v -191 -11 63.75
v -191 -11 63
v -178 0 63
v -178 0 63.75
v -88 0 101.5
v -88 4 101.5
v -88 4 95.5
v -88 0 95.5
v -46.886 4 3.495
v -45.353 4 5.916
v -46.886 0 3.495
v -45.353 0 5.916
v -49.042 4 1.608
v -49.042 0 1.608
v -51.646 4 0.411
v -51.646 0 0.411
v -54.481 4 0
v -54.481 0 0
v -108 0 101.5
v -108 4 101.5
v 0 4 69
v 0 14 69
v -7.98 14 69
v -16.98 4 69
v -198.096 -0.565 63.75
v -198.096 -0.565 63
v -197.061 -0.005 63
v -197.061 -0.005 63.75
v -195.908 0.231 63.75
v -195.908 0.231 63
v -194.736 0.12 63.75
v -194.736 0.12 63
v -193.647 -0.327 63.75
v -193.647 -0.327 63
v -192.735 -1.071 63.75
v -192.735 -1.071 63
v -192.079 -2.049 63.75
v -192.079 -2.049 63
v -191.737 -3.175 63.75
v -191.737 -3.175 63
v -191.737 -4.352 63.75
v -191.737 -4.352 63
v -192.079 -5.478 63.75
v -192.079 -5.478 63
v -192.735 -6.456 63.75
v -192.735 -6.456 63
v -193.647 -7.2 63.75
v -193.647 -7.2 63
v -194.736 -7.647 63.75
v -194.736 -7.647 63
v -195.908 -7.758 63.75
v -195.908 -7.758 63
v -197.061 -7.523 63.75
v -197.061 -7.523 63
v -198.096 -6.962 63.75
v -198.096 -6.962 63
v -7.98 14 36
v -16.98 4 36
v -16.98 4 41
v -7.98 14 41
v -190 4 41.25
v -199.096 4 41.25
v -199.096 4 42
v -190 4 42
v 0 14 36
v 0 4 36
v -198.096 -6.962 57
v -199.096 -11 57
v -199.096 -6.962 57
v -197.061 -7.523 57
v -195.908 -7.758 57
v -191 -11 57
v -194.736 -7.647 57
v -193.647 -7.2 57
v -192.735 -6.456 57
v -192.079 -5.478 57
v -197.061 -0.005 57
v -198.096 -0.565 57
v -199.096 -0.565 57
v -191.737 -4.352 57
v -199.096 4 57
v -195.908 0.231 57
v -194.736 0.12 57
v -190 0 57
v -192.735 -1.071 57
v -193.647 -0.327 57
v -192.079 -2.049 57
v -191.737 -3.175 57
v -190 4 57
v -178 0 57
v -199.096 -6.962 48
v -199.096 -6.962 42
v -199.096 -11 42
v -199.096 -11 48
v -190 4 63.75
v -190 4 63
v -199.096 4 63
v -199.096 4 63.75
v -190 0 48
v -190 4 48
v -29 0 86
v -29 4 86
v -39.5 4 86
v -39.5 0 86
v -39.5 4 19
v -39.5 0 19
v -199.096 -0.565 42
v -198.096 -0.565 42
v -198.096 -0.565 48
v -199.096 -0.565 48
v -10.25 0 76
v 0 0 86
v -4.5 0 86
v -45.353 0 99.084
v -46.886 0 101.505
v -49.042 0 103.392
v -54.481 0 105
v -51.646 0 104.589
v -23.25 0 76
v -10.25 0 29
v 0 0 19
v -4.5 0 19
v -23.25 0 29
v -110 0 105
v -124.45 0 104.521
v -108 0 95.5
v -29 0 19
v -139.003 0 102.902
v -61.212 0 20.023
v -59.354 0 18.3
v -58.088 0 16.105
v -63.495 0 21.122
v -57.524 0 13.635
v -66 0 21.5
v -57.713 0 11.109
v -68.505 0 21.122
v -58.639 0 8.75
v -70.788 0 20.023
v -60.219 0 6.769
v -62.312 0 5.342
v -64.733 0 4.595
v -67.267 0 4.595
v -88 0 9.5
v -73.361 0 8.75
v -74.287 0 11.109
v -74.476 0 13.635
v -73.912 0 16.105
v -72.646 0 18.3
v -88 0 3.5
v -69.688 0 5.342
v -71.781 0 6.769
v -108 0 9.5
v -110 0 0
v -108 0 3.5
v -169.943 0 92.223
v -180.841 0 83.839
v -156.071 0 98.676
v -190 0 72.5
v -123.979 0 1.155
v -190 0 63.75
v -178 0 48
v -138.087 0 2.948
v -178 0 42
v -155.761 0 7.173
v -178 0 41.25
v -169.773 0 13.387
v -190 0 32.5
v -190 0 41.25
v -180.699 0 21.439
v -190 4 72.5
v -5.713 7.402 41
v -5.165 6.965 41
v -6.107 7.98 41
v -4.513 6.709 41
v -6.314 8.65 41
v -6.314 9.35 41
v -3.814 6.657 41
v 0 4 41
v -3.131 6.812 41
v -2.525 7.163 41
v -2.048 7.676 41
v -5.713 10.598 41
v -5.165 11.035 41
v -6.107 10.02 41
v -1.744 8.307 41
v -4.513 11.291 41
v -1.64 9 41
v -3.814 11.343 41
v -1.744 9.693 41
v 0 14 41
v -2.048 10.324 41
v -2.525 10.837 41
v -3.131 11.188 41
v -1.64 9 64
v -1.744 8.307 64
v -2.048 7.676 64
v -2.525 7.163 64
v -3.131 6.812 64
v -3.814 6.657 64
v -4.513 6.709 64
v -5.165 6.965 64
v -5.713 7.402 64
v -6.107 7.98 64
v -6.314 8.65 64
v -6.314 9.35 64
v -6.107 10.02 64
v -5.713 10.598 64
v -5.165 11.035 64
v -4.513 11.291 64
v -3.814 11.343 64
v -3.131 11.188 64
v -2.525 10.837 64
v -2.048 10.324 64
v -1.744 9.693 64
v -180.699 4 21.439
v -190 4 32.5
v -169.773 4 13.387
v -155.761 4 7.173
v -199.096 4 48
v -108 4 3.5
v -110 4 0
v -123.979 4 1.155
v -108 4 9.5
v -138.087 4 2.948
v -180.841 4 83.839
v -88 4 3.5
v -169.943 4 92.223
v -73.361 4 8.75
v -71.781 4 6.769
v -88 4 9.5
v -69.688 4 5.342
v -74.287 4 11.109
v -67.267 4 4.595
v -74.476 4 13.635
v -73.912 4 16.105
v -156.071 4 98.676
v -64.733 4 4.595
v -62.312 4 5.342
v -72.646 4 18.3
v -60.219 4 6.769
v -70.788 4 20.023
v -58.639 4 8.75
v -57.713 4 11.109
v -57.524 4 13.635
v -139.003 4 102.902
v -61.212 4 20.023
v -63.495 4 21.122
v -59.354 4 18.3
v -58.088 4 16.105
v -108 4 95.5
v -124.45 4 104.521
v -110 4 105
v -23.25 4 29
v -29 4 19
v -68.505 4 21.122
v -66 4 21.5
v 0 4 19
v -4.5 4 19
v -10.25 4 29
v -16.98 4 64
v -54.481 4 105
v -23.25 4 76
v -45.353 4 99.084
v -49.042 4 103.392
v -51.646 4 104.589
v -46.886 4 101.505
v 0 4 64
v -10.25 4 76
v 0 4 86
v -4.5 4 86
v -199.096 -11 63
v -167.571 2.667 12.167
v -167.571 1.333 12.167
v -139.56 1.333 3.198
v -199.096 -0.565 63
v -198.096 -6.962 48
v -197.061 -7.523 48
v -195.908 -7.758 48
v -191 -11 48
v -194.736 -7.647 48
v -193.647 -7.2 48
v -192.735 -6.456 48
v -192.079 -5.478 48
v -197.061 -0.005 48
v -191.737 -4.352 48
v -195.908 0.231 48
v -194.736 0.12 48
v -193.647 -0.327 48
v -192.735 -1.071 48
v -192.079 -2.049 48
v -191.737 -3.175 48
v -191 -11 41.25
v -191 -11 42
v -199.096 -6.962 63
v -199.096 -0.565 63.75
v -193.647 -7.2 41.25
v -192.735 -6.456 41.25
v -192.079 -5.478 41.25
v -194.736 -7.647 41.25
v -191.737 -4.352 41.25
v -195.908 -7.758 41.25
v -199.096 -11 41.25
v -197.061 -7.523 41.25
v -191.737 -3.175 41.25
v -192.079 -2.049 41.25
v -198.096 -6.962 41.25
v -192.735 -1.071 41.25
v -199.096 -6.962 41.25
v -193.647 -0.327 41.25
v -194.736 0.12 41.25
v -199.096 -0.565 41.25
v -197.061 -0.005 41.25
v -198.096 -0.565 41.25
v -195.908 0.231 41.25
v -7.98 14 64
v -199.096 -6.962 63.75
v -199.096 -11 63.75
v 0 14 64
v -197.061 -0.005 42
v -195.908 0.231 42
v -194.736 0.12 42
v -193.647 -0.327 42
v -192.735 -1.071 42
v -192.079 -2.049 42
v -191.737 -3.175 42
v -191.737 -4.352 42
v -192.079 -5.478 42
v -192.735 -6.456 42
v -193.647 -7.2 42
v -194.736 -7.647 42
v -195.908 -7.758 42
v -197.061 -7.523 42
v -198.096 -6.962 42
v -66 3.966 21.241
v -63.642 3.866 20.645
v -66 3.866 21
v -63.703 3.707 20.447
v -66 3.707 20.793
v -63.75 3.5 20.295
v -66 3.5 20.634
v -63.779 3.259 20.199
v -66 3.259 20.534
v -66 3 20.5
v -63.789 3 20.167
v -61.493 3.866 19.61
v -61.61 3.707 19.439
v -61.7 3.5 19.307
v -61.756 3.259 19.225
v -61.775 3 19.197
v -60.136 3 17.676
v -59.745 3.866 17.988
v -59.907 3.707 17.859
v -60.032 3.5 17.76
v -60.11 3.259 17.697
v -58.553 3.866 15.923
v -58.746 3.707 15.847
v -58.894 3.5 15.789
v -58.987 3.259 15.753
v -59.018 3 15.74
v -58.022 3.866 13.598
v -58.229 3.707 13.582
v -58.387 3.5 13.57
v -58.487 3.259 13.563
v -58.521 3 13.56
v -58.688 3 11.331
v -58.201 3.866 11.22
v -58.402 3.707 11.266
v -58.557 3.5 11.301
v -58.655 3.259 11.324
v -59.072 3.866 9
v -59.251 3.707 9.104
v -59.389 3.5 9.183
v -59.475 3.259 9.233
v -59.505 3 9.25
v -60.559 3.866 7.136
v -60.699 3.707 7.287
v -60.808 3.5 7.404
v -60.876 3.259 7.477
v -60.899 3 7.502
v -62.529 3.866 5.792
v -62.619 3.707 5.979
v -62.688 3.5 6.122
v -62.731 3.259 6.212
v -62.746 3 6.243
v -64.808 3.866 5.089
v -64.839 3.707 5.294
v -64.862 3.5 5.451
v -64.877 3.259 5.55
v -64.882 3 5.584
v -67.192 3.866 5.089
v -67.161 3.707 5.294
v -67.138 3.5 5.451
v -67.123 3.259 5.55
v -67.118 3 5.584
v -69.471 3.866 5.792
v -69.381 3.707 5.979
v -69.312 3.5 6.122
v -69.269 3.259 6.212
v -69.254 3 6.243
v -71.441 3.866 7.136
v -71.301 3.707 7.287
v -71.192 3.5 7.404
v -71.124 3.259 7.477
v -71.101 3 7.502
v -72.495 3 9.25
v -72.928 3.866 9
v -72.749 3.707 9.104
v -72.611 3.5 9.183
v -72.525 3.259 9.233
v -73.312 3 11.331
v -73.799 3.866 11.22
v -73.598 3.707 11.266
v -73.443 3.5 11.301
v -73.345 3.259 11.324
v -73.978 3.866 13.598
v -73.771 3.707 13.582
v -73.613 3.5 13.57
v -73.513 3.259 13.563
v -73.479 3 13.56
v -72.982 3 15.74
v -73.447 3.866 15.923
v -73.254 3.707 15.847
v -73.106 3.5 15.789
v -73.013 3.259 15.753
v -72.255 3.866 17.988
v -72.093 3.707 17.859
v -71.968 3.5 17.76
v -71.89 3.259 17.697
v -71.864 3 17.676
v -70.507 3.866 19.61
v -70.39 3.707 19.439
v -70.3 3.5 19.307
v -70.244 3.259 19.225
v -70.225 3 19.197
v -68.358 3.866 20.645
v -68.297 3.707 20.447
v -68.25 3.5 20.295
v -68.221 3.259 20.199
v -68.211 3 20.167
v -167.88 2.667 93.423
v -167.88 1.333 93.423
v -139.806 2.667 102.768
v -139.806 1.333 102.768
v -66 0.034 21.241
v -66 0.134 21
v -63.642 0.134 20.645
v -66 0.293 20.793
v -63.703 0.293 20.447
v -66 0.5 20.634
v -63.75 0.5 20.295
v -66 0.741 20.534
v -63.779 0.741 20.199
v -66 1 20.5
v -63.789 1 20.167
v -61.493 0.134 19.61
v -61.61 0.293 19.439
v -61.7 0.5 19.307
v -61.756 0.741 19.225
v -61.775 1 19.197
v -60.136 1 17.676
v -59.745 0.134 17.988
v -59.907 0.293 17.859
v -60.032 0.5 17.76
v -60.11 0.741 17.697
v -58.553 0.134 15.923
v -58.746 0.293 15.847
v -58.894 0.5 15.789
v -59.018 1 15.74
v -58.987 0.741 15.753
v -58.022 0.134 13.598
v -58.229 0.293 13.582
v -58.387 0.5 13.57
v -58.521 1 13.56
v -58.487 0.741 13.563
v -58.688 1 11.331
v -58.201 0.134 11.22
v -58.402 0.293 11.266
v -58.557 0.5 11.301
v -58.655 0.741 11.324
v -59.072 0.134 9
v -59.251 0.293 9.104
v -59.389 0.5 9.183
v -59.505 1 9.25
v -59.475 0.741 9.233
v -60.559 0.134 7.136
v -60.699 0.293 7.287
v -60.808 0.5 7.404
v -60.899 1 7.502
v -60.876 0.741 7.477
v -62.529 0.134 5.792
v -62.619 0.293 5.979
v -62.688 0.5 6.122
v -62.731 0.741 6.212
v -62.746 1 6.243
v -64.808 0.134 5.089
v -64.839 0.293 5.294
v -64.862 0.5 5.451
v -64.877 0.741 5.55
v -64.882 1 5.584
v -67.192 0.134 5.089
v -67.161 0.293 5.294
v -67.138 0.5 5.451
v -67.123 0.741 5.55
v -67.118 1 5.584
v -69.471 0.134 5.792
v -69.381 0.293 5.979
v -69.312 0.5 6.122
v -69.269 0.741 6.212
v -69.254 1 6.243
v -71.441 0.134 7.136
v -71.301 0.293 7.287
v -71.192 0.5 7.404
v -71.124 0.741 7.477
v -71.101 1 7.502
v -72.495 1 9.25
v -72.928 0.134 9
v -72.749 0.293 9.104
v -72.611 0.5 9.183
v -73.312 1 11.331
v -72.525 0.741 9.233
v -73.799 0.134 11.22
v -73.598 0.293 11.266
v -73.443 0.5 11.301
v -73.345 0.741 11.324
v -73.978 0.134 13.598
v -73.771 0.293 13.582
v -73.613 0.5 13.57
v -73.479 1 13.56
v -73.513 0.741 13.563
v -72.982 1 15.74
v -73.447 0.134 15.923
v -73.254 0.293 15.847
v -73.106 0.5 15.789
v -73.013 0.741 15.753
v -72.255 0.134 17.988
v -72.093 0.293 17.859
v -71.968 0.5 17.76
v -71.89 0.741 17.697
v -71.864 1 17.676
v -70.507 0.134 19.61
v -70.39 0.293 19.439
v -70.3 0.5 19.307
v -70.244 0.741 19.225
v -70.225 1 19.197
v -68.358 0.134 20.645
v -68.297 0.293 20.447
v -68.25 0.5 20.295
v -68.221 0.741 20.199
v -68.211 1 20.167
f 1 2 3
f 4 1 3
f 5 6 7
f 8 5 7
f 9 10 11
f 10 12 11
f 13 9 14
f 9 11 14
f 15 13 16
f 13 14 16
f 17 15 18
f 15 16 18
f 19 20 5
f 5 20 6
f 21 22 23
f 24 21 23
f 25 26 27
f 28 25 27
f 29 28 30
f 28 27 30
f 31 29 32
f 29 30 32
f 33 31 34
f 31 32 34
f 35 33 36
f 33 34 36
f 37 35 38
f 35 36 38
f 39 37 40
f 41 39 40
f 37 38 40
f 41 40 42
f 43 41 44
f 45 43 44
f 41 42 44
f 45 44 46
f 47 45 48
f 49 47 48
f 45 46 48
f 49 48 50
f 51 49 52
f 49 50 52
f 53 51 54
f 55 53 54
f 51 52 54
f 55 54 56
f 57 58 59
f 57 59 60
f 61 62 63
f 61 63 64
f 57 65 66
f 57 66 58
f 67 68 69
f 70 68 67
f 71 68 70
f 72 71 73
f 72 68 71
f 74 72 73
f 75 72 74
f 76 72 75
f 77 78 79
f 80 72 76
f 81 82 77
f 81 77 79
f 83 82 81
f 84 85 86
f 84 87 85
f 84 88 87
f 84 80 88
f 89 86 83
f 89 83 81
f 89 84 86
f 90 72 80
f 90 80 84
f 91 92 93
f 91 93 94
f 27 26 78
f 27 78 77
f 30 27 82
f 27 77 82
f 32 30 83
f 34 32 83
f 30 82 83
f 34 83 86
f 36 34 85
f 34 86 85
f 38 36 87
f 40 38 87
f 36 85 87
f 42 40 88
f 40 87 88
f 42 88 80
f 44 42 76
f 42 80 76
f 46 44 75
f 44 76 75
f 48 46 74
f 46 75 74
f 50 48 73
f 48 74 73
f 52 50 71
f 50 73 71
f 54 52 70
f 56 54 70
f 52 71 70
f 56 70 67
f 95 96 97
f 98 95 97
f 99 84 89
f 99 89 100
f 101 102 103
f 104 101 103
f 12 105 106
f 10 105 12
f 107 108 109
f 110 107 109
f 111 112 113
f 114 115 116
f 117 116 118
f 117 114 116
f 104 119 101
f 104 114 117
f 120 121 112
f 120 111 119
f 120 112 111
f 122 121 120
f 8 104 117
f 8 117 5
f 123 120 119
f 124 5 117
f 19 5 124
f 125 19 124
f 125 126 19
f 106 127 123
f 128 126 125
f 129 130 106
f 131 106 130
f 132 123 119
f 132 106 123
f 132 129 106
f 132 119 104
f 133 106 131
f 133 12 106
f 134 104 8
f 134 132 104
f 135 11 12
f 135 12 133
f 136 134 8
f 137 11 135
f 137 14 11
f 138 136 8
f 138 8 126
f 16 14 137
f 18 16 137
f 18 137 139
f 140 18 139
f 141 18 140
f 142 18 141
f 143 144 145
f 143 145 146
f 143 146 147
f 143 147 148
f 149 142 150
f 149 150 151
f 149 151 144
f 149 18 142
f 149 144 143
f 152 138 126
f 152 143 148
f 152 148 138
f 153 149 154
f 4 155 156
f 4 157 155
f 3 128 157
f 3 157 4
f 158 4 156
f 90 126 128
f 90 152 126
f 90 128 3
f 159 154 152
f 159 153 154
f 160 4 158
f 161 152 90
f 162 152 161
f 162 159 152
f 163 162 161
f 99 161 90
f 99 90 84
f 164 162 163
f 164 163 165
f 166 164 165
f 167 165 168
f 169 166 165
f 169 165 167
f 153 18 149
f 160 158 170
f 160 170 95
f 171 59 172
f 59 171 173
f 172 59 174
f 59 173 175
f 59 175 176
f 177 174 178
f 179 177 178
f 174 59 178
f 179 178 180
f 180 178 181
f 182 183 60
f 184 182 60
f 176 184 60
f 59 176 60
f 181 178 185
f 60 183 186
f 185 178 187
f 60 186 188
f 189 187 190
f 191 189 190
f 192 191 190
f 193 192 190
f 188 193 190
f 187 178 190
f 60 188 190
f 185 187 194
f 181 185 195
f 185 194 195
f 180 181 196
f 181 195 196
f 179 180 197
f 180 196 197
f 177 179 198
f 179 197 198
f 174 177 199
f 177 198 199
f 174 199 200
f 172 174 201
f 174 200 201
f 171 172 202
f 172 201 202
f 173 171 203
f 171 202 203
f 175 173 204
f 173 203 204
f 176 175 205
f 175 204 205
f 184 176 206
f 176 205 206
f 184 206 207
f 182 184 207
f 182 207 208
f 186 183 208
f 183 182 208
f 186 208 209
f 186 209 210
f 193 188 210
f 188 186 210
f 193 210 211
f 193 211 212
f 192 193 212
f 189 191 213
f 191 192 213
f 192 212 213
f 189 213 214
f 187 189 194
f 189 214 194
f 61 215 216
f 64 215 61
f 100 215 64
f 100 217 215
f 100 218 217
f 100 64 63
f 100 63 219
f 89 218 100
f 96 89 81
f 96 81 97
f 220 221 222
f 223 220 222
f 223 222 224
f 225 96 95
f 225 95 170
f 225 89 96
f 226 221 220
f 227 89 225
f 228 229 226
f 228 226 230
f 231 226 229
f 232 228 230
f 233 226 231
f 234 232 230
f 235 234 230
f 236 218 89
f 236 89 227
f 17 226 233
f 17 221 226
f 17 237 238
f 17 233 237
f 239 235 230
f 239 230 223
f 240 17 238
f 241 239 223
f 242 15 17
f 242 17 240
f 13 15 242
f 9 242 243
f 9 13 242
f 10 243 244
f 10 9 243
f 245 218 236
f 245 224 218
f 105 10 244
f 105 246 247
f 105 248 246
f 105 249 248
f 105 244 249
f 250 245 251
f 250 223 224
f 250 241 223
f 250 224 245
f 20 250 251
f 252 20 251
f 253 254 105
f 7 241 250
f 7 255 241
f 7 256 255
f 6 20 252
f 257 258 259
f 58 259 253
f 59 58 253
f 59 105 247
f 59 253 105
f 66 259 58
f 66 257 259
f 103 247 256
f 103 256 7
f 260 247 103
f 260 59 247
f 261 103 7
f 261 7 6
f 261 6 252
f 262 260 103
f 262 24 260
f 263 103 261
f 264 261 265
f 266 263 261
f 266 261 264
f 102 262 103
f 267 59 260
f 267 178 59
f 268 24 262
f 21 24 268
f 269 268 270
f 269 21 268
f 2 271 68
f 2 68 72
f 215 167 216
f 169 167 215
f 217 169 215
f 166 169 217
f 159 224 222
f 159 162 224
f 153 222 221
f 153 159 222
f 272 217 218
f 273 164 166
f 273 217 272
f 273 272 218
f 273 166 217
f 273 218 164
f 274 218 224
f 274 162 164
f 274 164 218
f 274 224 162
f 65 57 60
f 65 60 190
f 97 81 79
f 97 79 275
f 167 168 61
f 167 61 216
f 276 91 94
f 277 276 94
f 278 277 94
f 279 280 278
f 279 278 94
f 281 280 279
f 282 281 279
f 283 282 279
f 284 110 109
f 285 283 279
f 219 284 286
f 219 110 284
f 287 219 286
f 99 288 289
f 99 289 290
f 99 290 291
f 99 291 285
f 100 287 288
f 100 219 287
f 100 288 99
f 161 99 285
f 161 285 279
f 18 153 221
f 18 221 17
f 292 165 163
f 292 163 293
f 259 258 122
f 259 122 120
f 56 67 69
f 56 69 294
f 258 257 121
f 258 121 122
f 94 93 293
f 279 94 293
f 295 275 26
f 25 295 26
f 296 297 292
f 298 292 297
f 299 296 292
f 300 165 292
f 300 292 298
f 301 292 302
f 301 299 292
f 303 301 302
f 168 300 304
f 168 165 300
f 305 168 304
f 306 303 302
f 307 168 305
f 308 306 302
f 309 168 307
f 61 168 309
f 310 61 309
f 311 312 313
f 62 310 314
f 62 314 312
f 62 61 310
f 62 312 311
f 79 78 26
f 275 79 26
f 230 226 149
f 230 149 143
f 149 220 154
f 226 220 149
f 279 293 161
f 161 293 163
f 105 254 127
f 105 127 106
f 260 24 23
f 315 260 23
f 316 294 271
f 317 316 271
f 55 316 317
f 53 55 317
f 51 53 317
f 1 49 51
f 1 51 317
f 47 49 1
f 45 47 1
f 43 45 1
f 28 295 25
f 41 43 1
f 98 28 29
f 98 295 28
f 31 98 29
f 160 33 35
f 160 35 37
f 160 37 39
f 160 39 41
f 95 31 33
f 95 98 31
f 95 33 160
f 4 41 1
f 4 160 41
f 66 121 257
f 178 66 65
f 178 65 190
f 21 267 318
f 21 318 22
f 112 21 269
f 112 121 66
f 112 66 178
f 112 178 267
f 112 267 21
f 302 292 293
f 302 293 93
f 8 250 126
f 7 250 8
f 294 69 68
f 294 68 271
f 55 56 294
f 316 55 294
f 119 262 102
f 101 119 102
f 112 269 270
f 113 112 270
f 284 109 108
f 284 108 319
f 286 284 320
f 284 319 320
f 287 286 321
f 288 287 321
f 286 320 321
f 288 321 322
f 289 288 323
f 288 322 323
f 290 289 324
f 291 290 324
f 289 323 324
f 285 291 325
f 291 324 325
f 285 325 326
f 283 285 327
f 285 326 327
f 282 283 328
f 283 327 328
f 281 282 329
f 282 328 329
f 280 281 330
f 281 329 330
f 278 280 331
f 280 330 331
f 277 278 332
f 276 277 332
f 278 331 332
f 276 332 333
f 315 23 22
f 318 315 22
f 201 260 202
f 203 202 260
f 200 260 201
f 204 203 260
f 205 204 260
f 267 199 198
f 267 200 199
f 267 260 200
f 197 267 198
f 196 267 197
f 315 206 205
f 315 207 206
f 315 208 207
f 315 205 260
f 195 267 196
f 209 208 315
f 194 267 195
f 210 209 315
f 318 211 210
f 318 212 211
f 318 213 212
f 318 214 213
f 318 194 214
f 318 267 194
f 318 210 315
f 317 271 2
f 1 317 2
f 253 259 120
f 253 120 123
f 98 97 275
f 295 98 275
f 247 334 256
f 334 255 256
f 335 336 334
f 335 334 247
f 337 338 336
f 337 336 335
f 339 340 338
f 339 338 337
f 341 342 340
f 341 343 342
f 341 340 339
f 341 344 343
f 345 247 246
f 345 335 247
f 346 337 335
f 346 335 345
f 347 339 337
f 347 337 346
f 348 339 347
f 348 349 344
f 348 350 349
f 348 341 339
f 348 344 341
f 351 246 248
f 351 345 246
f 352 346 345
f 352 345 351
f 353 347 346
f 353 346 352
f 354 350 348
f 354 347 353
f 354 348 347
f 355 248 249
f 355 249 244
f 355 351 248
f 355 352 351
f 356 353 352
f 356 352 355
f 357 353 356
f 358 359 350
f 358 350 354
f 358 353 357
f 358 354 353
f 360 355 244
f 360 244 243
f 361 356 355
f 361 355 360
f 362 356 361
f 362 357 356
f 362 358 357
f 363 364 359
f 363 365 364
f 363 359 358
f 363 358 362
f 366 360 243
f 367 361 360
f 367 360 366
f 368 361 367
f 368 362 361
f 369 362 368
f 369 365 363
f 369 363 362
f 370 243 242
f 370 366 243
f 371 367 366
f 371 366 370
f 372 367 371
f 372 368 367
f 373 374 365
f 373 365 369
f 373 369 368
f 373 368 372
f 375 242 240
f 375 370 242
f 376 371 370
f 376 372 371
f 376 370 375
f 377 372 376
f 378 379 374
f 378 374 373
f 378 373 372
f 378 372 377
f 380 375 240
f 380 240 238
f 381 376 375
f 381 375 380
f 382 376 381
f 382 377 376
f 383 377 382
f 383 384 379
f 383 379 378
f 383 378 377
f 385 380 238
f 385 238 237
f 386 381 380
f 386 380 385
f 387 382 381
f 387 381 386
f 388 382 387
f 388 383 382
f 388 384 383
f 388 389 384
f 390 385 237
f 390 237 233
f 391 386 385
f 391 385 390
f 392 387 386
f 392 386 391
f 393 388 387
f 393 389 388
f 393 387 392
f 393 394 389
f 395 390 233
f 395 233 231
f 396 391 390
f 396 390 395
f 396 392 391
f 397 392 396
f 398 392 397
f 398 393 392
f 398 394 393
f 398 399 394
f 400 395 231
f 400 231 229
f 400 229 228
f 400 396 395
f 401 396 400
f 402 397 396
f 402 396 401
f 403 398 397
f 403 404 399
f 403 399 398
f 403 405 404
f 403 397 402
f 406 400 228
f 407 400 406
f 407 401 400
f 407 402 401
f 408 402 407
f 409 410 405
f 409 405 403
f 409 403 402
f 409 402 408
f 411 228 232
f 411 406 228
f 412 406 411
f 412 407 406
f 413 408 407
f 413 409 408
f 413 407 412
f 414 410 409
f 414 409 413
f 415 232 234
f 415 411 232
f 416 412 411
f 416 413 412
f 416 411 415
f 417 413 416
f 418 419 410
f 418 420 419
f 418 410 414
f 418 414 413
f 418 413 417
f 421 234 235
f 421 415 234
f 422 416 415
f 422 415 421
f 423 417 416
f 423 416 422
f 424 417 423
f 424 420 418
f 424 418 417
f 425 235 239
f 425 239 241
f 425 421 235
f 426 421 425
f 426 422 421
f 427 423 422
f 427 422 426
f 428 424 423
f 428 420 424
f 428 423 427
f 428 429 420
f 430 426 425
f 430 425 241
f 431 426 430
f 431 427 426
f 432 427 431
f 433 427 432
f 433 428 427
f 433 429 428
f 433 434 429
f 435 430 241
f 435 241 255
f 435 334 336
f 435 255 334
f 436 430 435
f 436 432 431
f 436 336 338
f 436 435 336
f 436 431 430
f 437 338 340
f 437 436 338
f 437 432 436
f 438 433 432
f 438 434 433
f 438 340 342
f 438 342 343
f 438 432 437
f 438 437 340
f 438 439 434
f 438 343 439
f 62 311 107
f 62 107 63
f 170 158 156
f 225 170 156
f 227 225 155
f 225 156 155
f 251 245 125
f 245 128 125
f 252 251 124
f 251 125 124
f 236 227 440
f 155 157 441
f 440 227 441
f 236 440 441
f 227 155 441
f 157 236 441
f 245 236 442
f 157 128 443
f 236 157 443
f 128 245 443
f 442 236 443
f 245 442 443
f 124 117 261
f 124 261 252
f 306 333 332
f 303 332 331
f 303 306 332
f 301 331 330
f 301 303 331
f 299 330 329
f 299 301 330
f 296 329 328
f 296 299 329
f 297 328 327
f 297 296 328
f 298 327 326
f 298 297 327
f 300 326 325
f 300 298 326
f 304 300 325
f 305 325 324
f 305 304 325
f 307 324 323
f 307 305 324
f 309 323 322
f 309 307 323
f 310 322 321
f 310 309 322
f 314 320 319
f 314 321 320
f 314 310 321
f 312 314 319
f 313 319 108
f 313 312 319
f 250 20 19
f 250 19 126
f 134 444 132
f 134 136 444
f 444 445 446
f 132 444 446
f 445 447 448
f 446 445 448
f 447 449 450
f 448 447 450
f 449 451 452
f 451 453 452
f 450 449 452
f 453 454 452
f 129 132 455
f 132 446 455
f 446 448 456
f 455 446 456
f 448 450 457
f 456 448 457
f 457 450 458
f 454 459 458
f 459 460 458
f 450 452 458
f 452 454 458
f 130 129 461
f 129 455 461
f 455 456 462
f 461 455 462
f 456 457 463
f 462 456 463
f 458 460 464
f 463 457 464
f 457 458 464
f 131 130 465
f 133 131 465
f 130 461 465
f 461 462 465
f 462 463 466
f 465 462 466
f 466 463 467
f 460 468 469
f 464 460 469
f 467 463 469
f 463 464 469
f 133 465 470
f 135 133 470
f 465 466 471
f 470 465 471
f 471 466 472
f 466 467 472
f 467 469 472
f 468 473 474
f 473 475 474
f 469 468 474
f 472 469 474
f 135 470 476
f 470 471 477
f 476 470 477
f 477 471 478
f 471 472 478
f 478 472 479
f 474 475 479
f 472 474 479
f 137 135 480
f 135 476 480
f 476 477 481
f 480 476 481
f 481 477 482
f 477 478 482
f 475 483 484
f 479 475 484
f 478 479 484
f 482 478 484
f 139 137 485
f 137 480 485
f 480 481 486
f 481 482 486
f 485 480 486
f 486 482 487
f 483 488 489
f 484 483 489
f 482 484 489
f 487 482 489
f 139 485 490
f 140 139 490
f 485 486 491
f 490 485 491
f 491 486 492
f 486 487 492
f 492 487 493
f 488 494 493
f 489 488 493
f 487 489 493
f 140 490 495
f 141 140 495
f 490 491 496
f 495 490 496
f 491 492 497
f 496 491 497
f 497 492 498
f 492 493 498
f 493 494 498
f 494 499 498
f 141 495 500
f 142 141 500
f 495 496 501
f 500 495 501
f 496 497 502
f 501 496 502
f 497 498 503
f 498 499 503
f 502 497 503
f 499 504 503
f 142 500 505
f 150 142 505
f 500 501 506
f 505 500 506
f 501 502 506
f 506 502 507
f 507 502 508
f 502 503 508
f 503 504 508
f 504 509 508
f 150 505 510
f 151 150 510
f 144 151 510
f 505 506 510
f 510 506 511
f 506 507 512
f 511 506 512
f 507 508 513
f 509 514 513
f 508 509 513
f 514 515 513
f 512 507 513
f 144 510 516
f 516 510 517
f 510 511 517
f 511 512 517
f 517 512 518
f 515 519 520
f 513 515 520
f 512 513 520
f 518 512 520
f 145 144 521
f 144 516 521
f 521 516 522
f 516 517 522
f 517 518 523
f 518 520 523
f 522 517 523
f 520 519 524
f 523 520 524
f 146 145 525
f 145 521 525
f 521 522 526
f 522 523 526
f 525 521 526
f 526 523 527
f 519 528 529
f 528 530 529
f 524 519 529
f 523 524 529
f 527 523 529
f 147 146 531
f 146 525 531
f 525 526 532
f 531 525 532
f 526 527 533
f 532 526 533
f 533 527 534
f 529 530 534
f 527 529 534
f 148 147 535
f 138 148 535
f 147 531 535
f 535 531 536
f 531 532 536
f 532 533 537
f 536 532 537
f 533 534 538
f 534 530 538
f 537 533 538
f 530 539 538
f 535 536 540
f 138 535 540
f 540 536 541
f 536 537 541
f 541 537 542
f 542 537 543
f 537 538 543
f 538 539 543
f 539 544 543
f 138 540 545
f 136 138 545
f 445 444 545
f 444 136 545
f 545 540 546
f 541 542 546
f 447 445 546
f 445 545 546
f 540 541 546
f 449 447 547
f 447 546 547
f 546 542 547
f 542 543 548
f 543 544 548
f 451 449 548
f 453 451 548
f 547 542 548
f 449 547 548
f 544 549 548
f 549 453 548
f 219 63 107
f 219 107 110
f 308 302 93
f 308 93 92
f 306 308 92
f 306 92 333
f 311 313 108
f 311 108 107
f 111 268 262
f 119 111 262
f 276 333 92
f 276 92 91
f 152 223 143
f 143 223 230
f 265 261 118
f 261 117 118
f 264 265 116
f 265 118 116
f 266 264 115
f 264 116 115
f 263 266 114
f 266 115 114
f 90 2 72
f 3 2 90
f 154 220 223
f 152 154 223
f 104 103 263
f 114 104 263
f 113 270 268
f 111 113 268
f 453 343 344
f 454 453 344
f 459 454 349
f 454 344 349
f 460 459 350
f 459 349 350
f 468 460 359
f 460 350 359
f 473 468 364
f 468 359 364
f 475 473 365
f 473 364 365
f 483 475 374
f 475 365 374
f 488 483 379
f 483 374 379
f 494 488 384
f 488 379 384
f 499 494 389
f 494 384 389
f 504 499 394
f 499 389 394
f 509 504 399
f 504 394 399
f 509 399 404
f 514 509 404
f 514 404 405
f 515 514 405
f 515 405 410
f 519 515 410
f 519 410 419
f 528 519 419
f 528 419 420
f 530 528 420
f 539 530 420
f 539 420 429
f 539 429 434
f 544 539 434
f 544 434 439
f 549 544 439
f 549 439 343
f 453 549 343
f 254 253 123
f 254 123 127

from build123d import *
from build123d.topology import SkipClean

# Parameters (mm, degrees)
BOSS_EXTRUDE1_DEPTH     = 4
BOSS_EXTRUDE2_START     = -45
BOSS_EXTRUDE2_DEPTH     = 3
BOSS_EXTRUDE3_START     = -39
BOSS_EXTRUDE3_DEPTH     = 3
BOSS_EXTRUDE4_REACH     = 213.107
SKETCH6_R               = 2.5
SKETCH7_W               = 20
SKETCH7_H               = 6
CUT_EXTRUDE1_DEPTH      = 10
CUT_EXTRUDE2_DEPTH      = 228.268563733
FILLET1_R               = 10
CUT_EXTRUDE3_DEPTH      = 228.268563733
SKETCH12_W              = 23
SKETCH12_H              = 10
CUT_EXTRUDE6_DEPTH      = 21
BOSS_EXTRUDE5_REACH     = 213.407
SKETCH13_R              = 2.35
CUT_EXTRUDE7_DEPTH      = 209.214432859
CUT_EXTRUDE7_DEPTH_BACK = 209.214432859
SKETCH15_W              = 6
SKETCH15_H              = 4.56544039
SKETCH15_H_2            = 4.038157292
BOSS_EXTRUDE6_DEPTH     = 1
SKETCH8_R               = 7.5
CUT_EXTRUDE8_DEPTH      = 10
FILLET2_R               = 1
BOSS_EXTRUDE7_START     = 0.75
BOSS_EXTRUDE7_DEPTH     = 0.75
BOSS_EXTRUDE8_DEPTH     = 0.75


with BuildPart() as part:
    # Sketch1 → Boss-Extrude1 (new body)
    with BuildSketch(Plane(origin=(0, 0, 0), x_dir=(1, 0, 0), z_dir=(0, 1, 0))):
        with BuildLine():
            Line((-110, 0), (0, 0))
            Line((0, 0), (0, -105))
            Line((0, -105), (-110, -105))
            add(Edge.make_bspline(
                [(-190, -72.5), (-172.262756658, -100.700379519), (-139.265999107, -104.836107107), (-110, -105)],
                knots=[0, 0, 0, 0, 1, 1, 1, 1], degree=3))
            Line((-190, -72.5), (-190, -32.5))
            add(Edge.make_bspline(
                [(-190, -32.5), (-171.707374586, -4.618888995), (-138.989901699, -2.178666842), (-110, 0)],
                knots=[0, 0, 0, 0, 1, 1, 1, 1], degree=3))
        make_face()
    extrude(amount=BOSS_EXTRUDE1_DEPTH)

    # Sketch2 → Boss-Extrude2 (add, symmetric)
    with BuildSketch(Plane.XY.offset(105).offset(BOSS_EXTRUDE2_START)):
        Polygon((-190, 4), (-201, 4), (-201, -11), (-191, -11), (-178, 0), align=None)
    boss_extrude2 = extrude(amount=BOSS_EXTRUDE2_DEPTH, both=True)

    # Mirror1: Boss-Extrude2 across plane
    add(boss_extrude2.mirror(Plane.XY.offset(52.5)))

    # Sketch5 → Boss-Extrude3 (add, symmetric)
    with BuildSketch(Plane.XY.offset(105).offset(BOSS_EXTRUDE3_START)):
        Polygon((-16.979807258, 4), (-7.979807258, 14), (0, 14), (0, 4), align=None)
    boss_extrude3 = extrude(amount=BOSS_EXTRUDE3_DEPTH, both=True)

    # Mirror4: Boss-Extrude3 across plane
    add(boss_extrude3.mirror(Plane.XY.offset(52.5)))

    # Sketch6 → Boss-Extrude4 (add, up to next)
    with BuildSketch(Plane.XY.offset(42), mode=Mode.PRIVATE) as boss_extrude4_sk1:
        with Locations(Location((-4, 10, 0), (0, 0, 180))):
            Circle(SKETCH6_R)
    boss_extrude4_tool1 = extrude(boss_extrude4_sk1.sketch, amount=BOSS_EXTRUDE4_REACH, mode=Mode.PRIVATE) - part.part
    add(boss_extrude4_tool1.solids().sort_by_distance((-4, 10, 42))[0])

    # Sketch7 → Cut-Extrude1 (cut)
    with BuildSketch(Plane(origin=(0, 4, 0), x_dir=(1, 0, 0), z_dir=(0, 1, 0))):
        with Locations((-98, -98.5)):
            Rectangle(SKETCH7_W, SKETCH7_H)
    cut_extrude1 = extrude(amount=-CUT_EXTRUDE1_DEPTH, mode=Mode.SUBTRACT)

    # Mirror5: Cut-Extrude1 across plane
    add(cut_extrude1.mirror(Plane.XY.offset(52.5)), mode=Mode.SUBTRACT)

    # Sketch10 → Cut-Extrude2 (cut, symmetric)
    with BuildSketch(Plane(origin=(0, 4, 0), x_dir=(1, 0, 0), z_dir=(0, 1, 0))):
        Polygon((0, -19), (-39.5, -19), (-48, 0), (0, 0), align=None)
    cut_extrude2 = extrude(amount=CUT_EXTRUDE2_DEPTH, both=True, mode=Mode.SUBTRACT)

    # Mirror6: Cut-Extrude2 across plane
    add(cut_extrude2.mirror(Plane.XY.offset(52.5)), mode=Mode.SUBTRACT)

    # Fillet1
    fillet1_edges = [part.edges().sort_by_distance(p)[0] for p in [
        (-48, 2, 0),
        (-48, 2, 105),
    ]]
    fillet(fillet1_edges, radius=FILLET1_R)

    # Sketch11 → Cut-Extrude3 (cut, symmetric)
    with BuildSketch(Plane(origin=(0, 4, 0), x_dir=(1, 0, 0), z_dir=(0, 1, 0))):
        Polygon((-4.5, -19), (-10.25, -29), (-23.25, -29), (-29, -19), align=None)
    cut_extrude3 = extrude(amount=CUT_EXTRUDE3_DEPTH, both=True, mode=Mode.SUBTRACT)

    # Mirror7: Cut-Extrude3 across plane
    add(cut_extrude3.mirror(Plane.XY.offset(52.5)), mode=Mode.SUBTRACT)

    # Sketch12 → Cut-Extrude6 (cut)
    with BuildSketch(Plane(origin=(0, 0, 0), x_dir=(0, 0, -1), z_dir=(1, 0, 0))):
        with Locations((-52.5, 9)):
            Rectangle(SKETCH12_W, SKETCH12_H)
    extrude(amount=-CUT_EXTRUDE6_DEPTH, mode=Mode.SUBTRACT)

    # Sketch13 → Boss-Extrude5 (add, up to next)
    with BuildSketch(Plane(origin=(0, 0, 64), x_dir=(-1, 0, 0), z_dir=(0, 0, -1)), mode=Mode.PRIVATE) as boss_extrude5_sk1:
        with Locations(Location((3.989903629, 9, 0), (0, 0, 180))):
            Circle(SKETCH13_R)
    boss_extrude5_tool1 = extrude(boss_extrude5_sk1.sketch, amount=BOSS_EXTRUDE5_REACH, mode=Mode.PRIVATE) - part.part
    add(boss_extrude5_tool1.solids().sort_by_distance((-3.989904, 9, 64))[0])

    # Sketch14 → Cut-Extrude7 (cut, two sides: drawn at the far end of the back side and taken through both)
    with BuildSketch(Plane.XY.offset(52.5).offset(-CUT_EXTRUDE7_DEPTH_BACK)):
        with BuildLine():
            Line((-198.09573372, 4), (-198.09573372, -0.56544039))
            ThreePointArc((-198.09573372, -0.56544039), (-191.693337136, -3.763641549), (-198.09573372, -6.961842708))
            Line((-198.09573372, -6.961842708), (-198.09573372, -11))
            Line((-198.09573372, -11), (-202.719197906, -12.115187625))
            Line((-202.719197906, -12.115187625), (-202.588499271, 4.842960165))
            Line((-202.588499271, 4.842960165), (-198.09573372, 4))
        make_face()
    extrude(amount=CUT_EXTRUDE7_DEPTH + CUT_EXTRUDE7_DEPTH_BACK, mode=Mode.SUBTRACT)

    # Sketch15 → Boss-Extrude6 (add)
    with BuildSketch(Plane.ZY.offset(198.09573372)):
        with Locations((60, 1.717279805)):
            Rectangle(SKETCH15_W, SKETCH15_H)
        with Locations((45, 1.717279805)):
            Rectangle(SKETCH15_W, SKETCH15_H)
        with Locations((45, -8.980921354)):
            Rectangle(SKETCH15_W, SKETCH15_H_2)
        with Locations((60, -8.980921354)):
            Rectangle(SKETCH15_W, SKETCH15_H_2)
    extrude(amount=BOSS_EXTRUDE6_DEPTH)

    # Sketch8 → Cut-Extrude8 (cut)
    with BuildSketch(Plane(origin=(0, 4, 0), x_dir=(1, 0, 0), z_dir=(0, 1, 0))):
        with Locations(Location((-66, -13, 0), (0, 0, 270))):
            Circle(SKETCH8_R)
    extrude(amount=-CUT_EXTRUDE8_DEPTH, mode=Mode.SUBTRACT)

    # Fillet2
    fillet2_edges = [part.edges().sort_by_distance(p)[0] for p in [
        (-66, 0, 5.5),
        (-66, 4, 5.5),
    ]]
    fillet(fillet2_edges, radius=FILLET2_R)

    # Sketch16 → Boss-Extrude7 (add)
    with SkipClean():  # the faces are left unmerged after this step: merging them gives an invalid solid
        with BuildSketch(Plane(origin=(0, 0, 42), x_dir=(-1, 0, 0), z_dir=(0, 0, -1)).offset(BOSS_EXTRUDE7_START)):
            with BuildLine():
                Line((198.09573372, -0.56544039), (199.09573372, -0.56544039))
                Line((199.09573372, -0.56544039), (199.09573372, 4))
                Line((199.09573372, 4), (190, 4))
                Line((190, 4), (190, 0))
                Line((190, 0), (178, 0))
                Line((178, 0), (191, -11))
                Line((191, -11), (199.09573372, -11))
                Line((199.09573372, -11), (199.09573372, -6.961842708))
                Line((199.09573372, -6.961842708), (198.09573372, -6.961842708))
                ThreePointArc((198.09573372, -6.961842708), (191.693337136, -3.763641549), (198.09573372, -0.56544039))
            make_face()
        extrude(amount=-BOSS_EXTRUDE7_DEPTH)

    # Sketch17 → Boss-Extrude8 (add)
    with SkipClean():  # the faces are left unmerged after this step: merging them gives an invalid solid
        with BuildSketch(Plane.XY.offset(63)):
            with BuildLine():
                Line((-190, 4), (-199.09573372, 4))
                Line((-199.09573372, 4), (-199.09573372, -0.56544039))
                Line((-199.09573372, -0.56544039), (-198.09573372, -0.56544039))
                ThreePointArc((-198.09573372, -0.56544039), (-191.693337136, -3.763641549), (-198.09573372, -6.961842708))
                Line((-198.09573372, -6.961842708), (-199.09573372, -6.961842708))
                Line((-199.09573372, -6.961842708), (-199.09573372, -11))
                Line((-199.09573372, -11), (-191, -11))
                Line((-191, -11), (-178, 0))
                Line((-178, 0), (-190, 0))
                Line((-190, 0), (-190, 4))
            make_face()
        extrude(amount=BOSS_EXTRUDE8_DEPTH)


solid = part.part
